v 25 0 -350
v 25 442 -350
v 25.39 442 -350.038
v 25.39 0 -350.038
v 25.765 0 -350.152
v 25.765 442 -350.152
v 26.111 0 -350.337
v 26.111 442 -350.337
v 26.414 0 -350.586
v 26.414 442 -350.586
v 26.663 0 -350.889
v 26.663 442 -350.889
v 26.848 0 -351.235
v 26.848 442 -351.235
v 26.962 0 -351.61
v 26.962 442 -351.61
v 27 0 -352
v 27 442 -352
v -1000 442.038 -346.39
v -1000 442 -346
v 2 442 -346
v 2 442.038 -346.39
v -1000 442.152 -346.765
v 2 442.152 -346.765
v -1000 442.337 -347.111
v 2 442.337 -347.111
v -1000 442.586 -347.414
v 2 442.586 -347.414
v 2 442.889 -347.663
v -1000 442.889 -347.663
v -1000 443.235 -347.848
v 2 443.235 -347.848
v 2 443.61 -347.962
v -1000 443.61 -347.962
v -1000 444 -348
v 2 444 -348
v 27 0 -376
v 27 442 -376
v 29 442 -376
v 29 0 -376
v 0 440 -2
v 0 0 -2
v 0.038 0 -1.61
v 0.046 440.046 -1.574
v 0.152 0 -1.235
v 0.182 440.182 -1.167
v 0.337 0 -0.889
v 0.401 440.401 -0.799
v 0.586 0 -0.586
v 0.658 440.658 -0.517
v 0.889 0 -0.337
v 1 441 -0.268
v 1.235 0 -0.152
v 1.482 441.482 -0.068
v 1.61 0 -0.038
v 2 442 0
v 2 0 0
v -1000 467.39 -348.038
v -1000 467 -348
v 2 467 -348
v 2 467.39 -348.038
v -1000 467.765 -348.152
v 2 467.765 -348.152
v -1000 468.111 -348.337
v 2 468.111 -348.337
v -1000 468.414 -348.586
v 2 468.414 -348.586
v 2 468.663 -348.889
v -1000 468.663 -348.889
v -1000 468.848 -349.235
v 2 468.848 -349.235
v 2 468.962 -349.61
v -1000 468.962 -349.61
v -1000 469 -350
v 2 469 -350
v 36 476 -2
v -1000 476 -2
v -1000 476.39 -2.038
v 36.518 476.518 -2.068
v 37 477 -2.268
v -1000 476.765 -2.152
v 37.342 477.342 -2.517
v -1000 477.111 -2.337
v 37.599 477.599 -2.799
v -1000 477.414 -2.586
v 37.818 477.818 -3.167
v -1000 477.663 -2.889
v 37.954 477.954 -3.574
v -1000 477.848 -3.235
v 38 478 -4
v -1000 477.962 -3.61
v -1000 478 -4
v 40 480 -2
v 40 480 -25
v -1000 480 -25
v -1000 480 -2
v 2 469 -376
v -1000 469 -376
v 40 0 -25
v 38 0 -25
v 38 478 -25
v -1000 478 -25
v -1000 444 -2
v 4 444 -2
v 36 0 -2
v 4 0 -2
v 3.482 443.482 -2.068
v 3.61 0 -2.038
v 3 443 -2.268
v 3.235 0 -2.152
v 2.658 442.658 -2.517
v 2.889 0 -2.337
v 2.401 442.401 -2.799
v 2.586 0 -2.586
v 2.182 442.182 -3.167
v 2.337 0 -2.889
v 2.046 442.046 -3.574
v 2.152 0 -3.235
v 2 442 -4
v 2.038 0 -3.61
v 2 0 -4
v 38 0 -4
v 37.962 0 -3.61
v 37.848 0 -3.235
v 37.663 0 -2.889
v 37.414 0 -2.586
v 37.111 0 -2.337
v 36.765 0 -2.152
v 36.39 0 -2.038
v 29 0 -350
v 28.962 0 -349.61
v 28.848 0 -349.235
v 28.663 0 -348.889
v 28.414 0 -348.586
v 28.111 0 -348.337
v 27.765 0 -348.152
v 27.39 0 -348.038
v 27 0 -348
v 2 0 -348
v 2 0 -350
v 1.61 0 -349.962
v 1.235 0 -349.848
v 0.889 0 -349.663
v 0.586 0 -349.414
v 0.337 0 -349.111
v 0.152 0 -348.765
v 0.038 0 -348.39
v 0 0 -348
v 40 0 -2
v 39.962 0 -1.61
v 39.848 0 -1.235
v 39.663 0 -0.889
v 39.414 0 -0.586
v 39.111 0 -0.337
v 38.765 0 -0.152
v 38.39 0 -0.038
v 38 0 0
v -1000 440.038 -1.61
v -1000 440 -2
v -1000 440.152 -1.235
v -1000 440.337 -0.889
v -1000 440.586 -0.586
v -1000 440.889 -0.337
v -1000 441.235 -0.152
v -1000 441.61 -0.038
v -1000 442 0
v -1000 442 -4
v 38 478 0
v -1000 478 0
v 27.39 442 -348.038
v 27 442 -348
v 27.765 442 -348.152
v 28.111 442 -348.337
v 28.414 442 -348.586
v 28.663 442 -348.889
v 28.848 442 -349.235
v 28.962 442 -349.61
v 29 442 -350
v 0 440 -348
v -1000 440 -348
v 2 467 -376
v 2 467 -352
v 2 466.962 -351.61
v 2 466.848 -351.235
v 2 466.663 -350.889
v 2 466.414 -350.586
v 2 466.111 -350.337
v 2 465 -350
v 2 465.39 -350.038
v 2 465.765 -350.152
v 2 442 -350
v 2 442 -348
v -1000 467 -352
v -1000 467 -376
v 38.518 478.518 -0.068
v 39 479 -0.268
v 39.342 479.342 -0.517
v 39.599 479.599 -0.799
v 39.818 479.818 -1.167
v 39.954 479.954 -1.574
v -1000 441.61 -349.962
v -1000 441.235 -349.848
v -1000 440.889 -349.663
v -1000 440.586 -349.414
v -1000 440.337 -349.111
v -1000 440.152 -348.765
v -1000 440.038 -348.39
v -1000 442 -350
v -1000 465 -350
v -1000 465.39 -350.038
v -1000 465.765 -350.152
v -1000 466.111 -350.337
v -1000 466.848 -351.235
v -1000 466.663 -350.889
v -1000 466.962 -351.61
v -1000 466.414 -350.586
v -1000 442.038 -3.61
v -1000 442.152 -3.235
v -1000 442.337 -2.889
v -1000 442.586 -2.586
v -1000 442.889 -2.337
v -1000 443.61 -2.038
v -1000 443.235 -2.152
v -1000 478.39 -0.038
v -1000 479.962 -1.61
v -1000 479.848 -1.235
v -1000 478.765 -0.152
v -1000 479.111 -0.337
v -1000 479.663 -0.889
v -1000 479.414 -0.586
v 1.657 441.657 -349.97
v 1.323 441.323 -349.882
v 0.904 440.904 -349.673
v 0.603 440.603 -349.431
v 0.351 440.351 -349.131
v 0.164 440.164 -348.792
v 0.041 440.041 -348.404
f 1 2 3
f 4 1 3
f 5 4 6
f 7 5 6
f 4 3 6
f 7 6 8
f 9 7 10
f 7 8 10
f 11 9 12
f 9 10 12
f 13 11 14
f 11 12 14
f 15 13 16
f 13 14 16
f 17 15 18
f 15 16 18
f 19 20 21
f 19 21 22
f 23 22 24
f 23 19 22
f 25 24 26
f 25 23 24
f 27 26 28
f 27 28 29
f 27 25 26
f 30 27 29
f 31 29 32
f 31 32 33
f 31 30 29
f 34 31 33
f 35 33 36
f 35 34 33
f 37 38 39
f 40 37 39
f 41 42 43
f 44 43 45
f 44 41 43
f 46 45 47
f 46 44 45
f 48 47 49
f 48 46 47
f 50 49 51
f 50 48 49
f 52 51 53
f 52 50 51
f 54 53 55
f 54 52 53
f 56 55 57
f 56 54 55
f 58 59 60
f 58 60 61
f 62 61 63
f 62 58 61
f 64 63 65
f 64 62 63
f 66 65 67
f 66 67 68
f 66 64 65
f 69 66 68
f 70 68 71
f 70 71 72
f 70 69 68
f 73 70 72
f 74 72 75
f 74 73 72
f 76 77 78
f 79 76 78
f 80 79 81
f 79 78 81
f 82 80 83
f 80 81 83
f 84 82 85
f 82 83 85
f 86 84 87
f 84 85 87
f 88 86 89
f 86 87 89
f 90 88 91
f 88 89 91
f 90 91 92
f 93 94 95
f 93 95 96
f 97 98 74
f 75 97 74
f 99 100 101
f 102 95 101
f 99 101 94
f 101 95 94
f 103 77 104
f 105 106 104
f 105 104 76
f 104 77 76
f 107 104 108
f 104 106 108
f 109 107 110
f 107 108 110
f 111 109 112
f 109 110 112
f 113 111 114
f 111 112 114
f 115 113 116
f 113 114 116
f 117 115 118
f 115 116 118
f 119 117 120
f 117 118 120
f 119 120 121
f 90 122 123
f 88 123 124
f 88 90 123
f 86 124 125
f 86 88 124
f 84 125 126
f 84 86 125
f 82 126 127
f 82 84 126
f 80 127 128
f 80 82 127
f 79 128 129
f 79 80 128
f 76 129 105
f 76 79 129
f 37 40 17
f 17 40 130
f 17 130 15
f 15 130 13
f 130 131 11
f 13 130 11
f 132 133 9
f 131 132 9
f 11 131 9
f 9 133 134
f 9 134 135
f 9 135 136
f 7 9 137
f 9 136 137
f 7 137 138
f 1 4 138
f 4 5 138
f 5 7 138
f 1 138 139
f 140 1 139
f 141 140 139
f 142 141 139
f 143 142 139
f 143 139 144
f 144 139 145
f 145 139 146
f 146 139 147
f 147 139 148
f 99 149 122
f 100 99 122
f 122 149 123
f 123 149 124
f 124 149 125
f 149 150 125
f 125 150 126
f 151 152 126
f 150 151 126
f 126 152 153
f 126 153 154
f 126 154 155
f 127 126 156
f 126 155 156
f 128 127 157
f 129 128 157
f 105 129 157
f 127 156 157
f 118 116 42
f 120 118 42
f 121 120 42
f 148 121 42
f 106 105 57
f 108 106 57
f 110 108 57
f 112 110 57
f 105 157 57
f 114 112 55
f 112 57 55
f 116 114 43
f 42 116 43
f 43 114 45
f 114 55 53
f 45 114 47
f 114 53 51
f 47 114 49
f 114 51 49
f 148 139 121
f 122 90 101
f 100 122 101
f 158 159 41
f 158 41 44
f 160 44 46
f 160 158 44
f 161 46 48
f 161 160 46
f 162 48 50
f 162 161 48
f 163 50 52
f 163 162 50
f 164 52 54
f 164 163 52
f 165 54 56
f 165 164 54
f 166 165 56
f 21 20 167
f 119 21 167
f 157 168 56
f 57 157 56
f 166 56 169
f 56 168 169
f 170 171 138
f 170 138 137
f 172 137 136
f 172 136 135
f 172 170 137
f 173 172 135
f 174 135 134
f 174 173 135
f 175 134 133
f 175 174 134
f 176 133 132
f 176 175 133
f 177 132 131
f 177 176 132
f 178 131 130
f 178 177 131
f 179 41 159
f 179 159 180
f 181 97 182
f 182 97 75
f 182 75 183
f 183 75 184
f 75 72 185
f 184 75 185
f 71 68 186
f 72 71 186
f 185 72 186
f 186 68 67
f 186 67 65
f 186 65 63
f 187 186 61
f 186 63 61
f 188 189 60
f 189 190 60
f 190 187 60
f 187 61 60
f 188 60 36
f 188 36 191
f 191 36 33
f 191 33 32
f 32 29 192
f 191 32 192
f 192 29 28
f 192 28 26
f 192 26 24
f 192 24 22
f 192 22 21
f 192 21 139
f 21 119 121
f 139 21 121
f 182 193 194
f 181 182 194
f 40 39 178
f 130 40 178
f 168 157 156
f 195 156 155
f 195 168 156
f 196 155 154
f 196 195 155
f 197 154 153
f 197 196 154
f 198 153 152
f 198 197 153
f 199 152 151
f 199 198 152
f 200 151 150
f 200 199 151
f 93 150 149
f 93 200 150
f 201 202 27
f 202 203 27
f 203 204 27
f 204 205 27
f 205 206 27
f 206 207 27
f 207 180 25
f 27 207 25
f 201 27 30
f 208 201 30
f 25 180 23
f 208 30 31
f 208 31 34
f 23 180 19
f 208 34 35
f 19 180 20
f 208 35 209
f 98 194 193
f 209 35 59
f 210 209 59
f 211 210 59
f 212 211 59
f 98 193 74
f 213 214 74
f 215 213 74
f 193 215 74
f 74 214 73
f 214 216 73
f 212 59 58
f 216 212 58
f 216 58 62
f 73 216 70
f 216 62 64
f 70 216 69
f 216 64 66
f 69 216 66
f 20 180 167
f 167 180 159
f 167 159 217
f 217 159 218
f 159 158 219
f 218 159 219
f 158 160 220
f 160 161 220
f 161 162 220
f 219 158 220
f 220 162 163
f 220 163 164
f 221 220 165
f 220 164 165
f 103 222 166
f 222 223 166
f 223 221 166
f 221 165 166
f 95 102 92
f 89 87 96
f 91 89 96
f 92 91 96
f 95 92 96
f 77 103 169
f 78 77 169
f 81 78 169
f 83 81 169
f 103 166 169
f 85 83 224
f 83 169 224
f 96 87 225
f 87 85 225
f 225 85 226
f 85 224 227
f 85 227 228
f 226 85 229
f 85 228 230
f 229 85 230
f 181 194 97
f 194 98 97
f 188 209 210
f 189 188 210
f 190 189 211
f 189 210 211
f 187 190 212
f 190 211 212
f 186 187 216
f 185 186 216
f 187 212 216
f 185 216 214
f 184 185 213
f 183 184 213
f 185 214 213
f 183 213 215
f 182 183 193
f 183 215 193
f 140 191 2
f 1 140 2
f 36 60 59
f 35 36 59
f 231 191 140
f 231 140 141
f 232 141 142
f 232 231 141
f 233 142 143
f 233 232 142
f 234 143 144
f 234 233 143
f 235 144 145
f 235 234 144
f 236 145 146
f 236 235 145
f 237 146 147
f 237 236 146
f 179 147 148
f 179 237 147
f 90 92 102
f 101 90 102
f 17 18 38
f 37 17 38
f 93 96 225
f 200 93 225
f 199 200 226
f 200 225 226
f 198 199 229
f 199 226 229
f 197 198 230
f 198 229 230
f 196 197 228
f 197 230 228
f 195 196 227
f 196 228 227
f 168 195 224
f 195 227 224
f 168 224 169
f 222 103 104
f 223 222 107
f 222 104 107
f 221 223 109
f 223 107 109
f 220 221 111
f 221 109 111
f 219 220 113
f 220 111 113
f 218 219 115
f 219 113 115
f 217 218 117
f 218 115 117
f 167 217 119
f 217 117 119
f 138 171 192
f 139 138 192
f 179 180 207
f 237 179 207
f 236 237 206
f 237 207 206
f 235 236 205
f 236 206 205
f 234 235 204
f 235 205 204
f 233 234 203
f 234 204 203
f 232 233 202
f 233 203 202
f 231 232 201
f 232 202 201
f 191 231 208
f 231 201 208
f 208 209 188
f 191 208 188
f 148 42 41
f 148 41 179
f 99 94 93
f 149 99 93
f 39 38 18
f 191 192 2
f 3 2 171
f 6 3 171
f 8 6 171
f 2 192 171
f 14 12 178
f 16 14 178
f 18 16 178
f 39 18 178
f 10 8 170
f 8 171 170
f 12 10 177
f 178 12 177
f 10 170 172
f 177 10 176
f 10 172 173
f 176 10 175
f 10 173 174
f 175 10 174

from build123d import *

# Parameters (mm, degrees)
F3_W         = 27
F3_H         = 27
F4_DEPTH     = 30
F5_T1_DEPTH  = 1002
F5_T3_DEPTH  = 1038
F5_T5_DEPTH  = 442
F5_T7_DEPTH  = 478
F5_T13_DEPTH = 447
F5_T17_DEPTH = 1007
F5_T20_DEPTH = 1012
F5_T22_DEPTH = 1050
F5_T24_DEPTH = 1005
F5_T26_DEPTH = 445
F5_T28_DEPTH = 490
F5_T30_DEPTH = 452
F5_T36_DEPTH = 1010
F5_T40_DEPTH = 450
F5_T47_DEPTH = 1010
F5_T51_DEPTH = 450


# Not quite as in the source:
# - a fillet or chamfer that OpenCascade refuses, or shapes differently, is made with other operations: its cross-section is extruded or revolved along the edge and cut away or added


with BuildPart() as f2:
    # F2: sweep along a path in F1
    with BuildLine(Plane.XY) as f2_path:
        Line((0, 0), (0, 440))
        Line((0, 440), (-1000, 440))
    # F0 (on Front) → F2 (sweep)
    with BuildSketch(Plane.XZ):
        Polygon((38, -2), (38, -25), (40, -25), (40, 0), (0, 0), (0, -350), (27, -350), (27, -376), (29, -376), (29, -348), (2, -348), (2, -2), align=None)
    sweep(path=f2_path.line, transition=Transition.RIGHT)

    # F3 (on face) → F4 (cut)
    with BuildSketch(Plane.XY.offset(-348)):
        with Locations((15.5, 455.5)):
            Rectangle(F3_W, F3_H)
    extrude(amount=-F4_DEPTH, mode=Mode.SUBTRACT)

    # F5: fillet of radius 2 on 15 edges, made by hand

    # F5_s2 → F5_t1 (join)
    with BuildSketch(Plane.YZ.offset(-1000)):
        with BuildLine():
            ThreePointArc((442, -346), (442.5857864376, -347.4142135624), (444, -348))
            Line((444, -348), (442, -348))
            Line((442, -348), (442, -346))
        make_face()
        with BuildLine():
            ThreePointArc((465, -350), (466.4142135624, -350.5857864376), (467, -352))
            Line((467, -352), (467, -350))
            Line((467, -350), (465, -350))
        make_face()
        with BuildLine():
            ThreePointArc((444, -2), (442.5857864376, -2.5857864376), (442, -4))
            Line((442, -4), (442, -2))
            Line((442, -2), (444, -2))
        make_face()
    extrude(amount=F5_T1_DEPTH)

    # F5_s4 → F5_t3 (join)
    with BuildSketch(Plane.YZ.offset(-1000)):
        with BuildLine():
            ThreePointArc((476, -2), (477.4142135624, -2.5857864376), (478, -4))
            Line((478, -4), (478, -2))
            Line((478, -2), (476, -2))
        make_face()
    extrude(amount=F5_T3_DEPTH)

    # F5_s6 → F5_t5 (join)
    with BuildSketch(Plane.XZ.offset(-442)):
        with BuildLine():
            ThreePointArc((25, -350), (26.4142135624, -350.5857864376), (27, -352))
            Line((27, -352), (27, -350))
            Line((27, -350), (25, -350))
        make_face()
        with BuildLine():
            ThreePointArc((4, -2), (2.5857864376, -2.5857864376), (2, -4))
            Line((2, -4), (2, -2))
            Line((2, -2), (4, -2))
        make_face()
    extrude(amount=F5_T5_DEPTH)

    # F5_s8 → F5_t7 (join)
    with BuildSketch(Plane.XZ.offset(-478)):
        with BuildLine():
            ThreePointArc((38, -4), (37.4142135624, -2.5857864376), (36, -2))
            Line((36, -2), (38, -2))
            Line((38, -2), (38, -4))
        make_face()
    extrude(amount=F5_T7_DEPTH)


with BuildPart() as f5_tool11:
    # F5_s12 → F5_t13 (new body)
    with BuildSketch(Plane.XZ):
        with BuildLine():
            ThreePointArc((4, -2), (2.5857864376, -2.5857864376), (2, -4))
            Line((2, -4), (2, -2))
            Line((2, -2), (4, -2))
        make_face()
    extrude(amount=-F5_T13_DEPTH)

    split(bisect_by=Plane.XZ.offset(-442), keep=Keep.BOTTOM)


with BuildPart() as f5_tool15:
    # F5_s16 → F5_t17 (new body)
    with BuildSketch(Plane.YZ.offset(7)):
        with BuildLine():
            ThreePointArc((444, -2), (442.5857864376, -2.5857864376), (442, -4))
            Line((442, -4), (442, -2))
            Line((442, -2), (444, -2))
        make_face()
    extrude(amount=-F5_T17_DEPTH)

    split(bisect_by=Plane.YZ.offset(2), keep=Keep.TOP)


with BuildPart() as f5_tool11_1:
    add(f5_tool11.part)

    # F5_t19: intersect F5_tool15
    add(f5_tool15.part, mode=Mode.INTERSECT)


with BuildPart() as f2_1:
    add(f2.part)

    # F5_t9: union F5_tool11
    add(f5_tool11_1.part)

    # F5_s21 → F5_t20 (cut)
    with BuildSketch(Plane.YZ.offset(-1005)):
        with BuildLine():
            ThreePointArc((467, -348), (468.4142135624, -348.5857864376), (469, -350))
            Line((469, -350), (469, -348))
            Line((469, -348), (467, -348))
        make_face()
    extrude(amount=F5_T20_DEPTH, mode=Mode.SUBTRACT)

    # F5_s23 → F5_t22 (cut)
    with BuildSketch(Plane.YZ.offset(-1005)):
        with BuildLine():
            ThreePointArc((480, -2), (479.4142135624, -0.5857864376), (478, 0))
            Line((478, 0), (480, 0))
            Line((480, 0), (480, -2))
        make_face()
    extrude(amount=F5_T22_DEPTH, mode=Mode.SUBTRACT)

    # F5_s25 → F5_t24 (cut)
    with BuildSketch(Plane.YZ.offset(-1005)):
        with BuildLine():
            ThreePointArc((440, -2), (440.5857864376, -0.5857864376), (442, 0))
            Line((442, 0), (440, 0))
            Line((440, 0), (440, -2))
        make_face()
        with BuildLine():
            ThreePointArc((440, -348), (440.5857864376, -349.4142135624), (442, -350))
            Line((442, -350), (440, -350))
            Line((440, -350), (440, -348))
        make_face()
    extrude(amount=F5_T24_DEPTH, mode=Mode.SUBTRACT)

    # F5_s27 → F5_t26 (cut)
    with BuildSketch(Plane.XZ.offset(-440)):
        with BuildLine():
            ThreePointArc((0, -2), (0.5857864376, -0.5857864376), (2, 0))
            Line((2, 0), (0, 0))
            Line((0, 0), (0, -2))
        make_face()
        with BuildLine():
            ThreePointArc((2, -350), (0.5857864376, -349.4142135624), (0, -348))
            Line((0, -348), (0, -350))
            Line((0, -350), (2, -350))
        make_face()
    extrude(amount=F5_T26_DEPTH, mode=Mode.SUBTRACT)

    # F5_s29 → F5_t28 (cut)
    with BuildSketch(Plane.XZ.offset(-485)):
        with BuildLine():
            ThreePointArc((38, 0), (39.4142135624, -0.5857864376), (40, -2))
            Line((40, -2), (40, 0))
            Line((40, 0), (38, 0))
        make_face()
    extrude(amount=F5_T28_DEPTH, mode=Mode.SUBTRACT)

    # F5_s31 → F5_t30 (cut)
    with BuildSketch(Plane.XZ.offset(-447)):
        with BuildLine():
            ThreePointArc((27, -348), (28.4142135624, -348.5857864376), (29, -350))
            Line((29, -350), (29, -348))
            Line((29, -348), (27, -348))
        make_face()
    extrude(amount=F5_T30_DEPTH, mode=Mode.SUBTRACT)


with BuildPart() as f5_tool34:
    # F5_s35 → F5_t36 (new body)
    with BuildSketch(Plane.YZ.offset(5)):
        with BuildLine():
            ThreePointArc((440, -2), (440.5857864376, -0.5857864376), (442, 0))
            Line((442, 0), (440, 0))
            Line((440, 0), (440, -2))
        make_face()
    extrude(amount=-F5_T36_DEPTH)

    split(bisect_by=Plane.YZ, keep=Keep.TOP)


with BuildPart() as f5_tool38:
    # F5_s39 → F5_t40 (new body)
    with BuildSketch(Plane.XZ.offset(5)):
        with BuildLine():
            ThreePointArc((0, -2), (0.5857864376, -0.5857864376), (2, 0))
            Line((2, 0), (0, 0))
            Line((0, 0), (0, -2))
        make_face()
    extrude(amount=-F5_T40_DEPTH)

    split(bisect_by=Plane.XZ.offset(-440), keep=Keep.BOTTOM)


with BuildPart() as f5_tool34_1:
    add(f5_tool34.part)

    # F5_t42: intersect F5_tool38
    add(f5_tool38.part, mode=Mode.INTERSECT)


with BuildPart() as f2_2:
    add(f2_1.part)

    # F5_t32: cut F5_tool34
    add(f5_tool34_1.part, mode=Mode.SUBTRACT)


with BuildPart() as f5_tool45:
    # F5_s46 → F5_t47 (new body)
    with BuildSketch(Plane.YZ.offset(5)):
        with BuildLine():
            ThreePointArc((440, -348), (440.5857864376, -349.4142135624), (442, -350))
            Line((442, -350), (440, -350))
            Line((440, -350), (440, -348))
        make_face()
    extrude(amount=-F5_T47_DEPTH)

    split(bisect_by=Plane.YZ, keep=Keep.TOP)


with BuildPart() as f5_tool49:
    # F5_s50 → F5_t51 (new body)
    with BuildSketch(Plane.XZ.offset(5)):
        with BuildLine():
            ThreePointArc((2, -350), (0.5857864376, -349.4142135624), (0, -348))
            Line((0, -348), (0, -350))
            Line((0, -350), (2, -350))
        make_face()
    extrude(amount=-F5_T51_DEPTH)

    split(bisect_by=Plane.XZ.offset(-440), keep=Keep.BOTTOM)


with BuildPart() as f5_tool45_1:
    add(f5_tool45.part)

    # F5_t53: intersect F5_tool49
    add(f5_tool49.part, mode=Mode.INTERSECT)


with BuildPart() as f2_3:
    add(f2_2.part)

    # F5_t43: cut F5_tool45
    add(f5_tool45_1.part, mode=Mode.SUBTRACT)


solid = f2_3.part
